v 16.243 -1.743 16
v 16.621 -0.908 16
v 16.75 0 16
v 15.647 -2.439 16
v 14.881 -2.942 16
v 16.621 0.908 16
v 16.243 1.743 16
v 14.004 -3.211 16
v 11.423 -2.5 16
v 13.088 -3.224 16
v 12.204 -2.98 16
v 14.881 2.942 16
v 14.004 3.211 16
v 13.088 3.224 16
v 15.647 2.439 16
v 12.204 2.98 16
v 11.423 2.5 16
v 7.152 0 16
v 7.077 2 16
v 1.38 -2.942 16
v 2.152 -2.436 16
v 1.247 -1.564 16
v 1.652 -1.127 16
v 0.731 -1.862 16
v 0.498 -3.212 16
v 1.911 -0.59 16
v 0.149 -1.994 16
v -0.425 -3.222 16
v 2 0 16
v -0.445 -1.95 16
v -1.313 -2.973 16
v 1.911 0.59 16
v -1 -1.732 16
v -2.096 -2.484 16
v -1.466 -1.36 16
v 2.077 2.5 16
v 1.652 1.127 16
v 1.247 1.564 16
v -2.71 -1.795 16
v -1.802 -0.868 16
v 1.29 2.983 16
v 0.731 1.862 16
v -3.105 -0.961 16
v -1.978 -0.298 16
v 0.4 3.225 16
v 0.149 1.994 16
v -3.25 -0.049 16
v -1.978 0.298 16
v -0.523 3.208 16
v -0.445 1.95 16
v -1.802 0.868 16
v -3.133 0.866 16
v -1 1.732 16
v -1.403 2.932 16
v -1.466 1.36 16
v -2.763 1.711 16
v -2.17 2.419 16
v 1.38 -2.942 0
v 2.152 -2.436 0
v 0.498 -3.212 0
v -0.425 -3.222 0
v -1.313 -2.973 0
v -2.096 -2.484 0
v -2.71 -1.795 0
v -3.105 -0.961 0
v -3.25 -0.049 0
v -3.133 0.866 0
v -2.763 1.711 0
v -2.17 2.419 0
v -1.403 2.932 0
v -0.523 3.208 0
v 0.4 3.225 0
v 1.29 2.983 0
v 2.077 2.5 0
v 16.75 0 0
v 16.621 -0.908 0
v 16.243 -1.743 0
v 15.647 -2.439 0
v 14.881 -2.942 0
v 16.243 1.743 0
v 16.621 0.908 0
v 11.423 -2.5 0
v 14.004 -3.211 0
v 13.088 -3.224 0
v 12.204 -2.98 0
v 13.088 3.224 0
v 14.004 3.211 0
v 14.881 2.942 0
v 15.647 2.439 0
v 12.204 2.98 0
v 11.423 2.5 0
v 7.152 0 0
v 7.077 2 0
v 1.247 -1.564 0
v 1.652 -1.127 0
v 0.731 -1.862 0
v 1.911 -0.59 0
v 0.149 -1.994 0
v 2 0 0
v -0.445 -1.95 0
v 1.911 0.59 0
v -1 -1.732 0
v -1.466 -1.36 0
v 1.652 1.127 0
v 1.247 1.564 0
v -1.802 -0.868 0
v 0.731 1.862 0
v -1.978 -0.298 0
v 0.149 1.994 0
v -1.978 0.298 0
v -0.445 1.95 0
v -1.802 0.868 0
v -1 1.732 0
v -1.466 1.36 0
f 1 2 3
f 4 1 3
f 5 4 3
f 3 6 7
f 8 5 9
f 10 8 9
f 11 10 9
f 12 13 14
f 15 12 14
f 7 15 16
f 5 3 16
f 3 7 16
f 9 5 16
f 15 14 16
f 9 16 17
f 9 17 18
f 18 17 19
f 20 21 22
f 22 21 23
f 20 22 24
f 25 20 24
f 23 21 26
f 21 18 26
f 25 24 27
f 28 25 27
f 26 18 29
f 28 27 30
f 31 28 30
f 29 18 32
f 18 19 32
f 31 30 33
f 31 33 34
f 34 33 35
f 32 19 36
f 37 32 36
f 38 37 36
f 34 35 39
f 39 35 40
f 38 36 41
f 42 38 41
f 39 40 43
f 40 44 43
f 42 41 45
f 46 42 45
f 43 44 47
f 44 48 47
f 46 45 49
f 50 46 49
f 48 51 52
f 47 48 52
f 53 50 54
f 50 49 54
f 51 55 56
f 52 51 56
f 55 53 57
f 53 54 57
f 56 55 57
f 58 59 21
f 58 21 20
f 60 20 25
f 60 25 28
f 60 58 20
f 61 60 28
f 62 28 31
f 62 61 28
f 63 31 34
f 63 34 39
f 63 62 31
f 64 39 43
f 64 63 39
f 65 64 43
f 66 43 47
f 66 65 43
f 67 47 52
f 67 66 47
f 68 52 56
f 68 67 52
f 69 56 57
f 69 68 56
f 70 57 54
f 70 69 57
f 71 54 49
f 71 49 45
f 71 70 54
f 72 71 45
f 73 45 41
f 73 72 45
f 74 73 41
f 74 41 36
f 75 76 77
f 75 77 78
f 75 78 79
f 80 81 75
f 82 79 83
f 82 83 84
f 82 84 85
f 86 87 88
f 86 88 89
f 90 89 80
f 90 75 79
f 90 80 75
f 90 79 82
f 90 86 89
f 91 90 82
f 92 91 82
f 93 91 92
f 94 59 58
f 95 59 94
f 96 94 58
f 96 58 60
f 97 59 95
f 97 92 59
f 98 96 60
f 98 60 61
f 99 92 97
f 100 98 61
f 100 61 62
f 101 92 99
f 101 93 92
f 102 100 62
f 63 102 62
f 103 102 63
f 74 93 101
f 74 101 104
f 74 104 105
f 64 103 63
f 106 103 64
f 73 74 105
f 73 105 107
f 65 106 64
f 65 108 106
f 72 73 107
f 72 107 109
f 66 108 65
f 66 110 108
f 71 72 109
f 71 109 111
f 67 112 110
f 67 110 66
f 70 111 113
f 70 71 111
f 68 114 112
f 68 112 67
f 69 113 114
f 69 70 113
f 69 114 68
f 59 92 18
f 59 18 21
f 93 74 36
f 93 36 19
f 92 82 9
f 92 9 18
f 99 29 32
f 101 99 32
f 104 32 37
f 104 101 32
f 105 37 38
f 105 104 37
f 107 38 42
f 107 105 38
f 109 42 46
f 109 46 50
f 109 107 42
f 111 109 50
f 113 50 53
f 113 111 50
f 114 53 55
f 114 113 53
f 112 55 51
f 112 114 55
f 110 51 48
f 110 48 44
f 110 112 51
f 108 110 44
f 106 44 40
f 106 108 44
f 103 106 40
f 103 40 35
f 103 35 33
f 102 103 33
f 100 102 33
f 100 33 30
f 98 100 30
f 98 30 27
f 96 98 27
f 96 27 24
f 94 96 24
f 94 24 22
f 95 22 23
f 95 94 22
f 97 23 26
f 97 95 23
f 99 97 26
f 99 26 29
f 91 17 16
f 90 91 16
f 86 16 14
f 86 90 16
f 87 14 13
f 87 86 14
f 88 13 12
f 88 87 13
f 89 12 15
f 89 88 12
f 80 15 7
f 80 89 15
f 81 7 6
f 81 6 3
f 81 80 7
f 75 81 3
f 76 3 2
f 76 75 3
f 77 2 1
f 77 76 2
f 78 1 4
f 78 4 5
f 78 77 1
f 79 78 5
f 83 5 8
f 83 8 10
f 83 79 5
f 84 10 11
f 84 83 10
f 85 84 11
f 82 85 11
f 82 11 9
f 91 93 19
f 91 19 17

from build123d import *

# Parameters (mm, degrees)
SKETCH1_R           = 2
BOSS_EXTRUDE1_DEPTH = 16


with BuildPart() as part:
    # Sketch1 → Boss-Extrude1 (new body)
    with BuildSketch(Plane.XY):
        with BuildLine():
            Line((2.076655966, 2.5), (7.076655966, 2))
            Line((7.076655966, 2), (11.423344034, 2.5))
            ThreePointArc((11.423344034, 2.5), (16.75, 0), (11.423344034, -2.5))
            Line((11.423344034, -2.5), (7.151636088, 0))
            Line((7.151636088, 0), (2.151636088, -2.43576726))
            ThreePointArc((2.151636088, -2.43576726), (-3.249625061, -0.049365635), (2.076655966, 2.5))
        make_face()
        Circle(SKETCH1_R, mode=Mode.SUBTRACT)
    extrude(amount=BOSS_EXTRUDE1_DEPTH)


solid = part.part
